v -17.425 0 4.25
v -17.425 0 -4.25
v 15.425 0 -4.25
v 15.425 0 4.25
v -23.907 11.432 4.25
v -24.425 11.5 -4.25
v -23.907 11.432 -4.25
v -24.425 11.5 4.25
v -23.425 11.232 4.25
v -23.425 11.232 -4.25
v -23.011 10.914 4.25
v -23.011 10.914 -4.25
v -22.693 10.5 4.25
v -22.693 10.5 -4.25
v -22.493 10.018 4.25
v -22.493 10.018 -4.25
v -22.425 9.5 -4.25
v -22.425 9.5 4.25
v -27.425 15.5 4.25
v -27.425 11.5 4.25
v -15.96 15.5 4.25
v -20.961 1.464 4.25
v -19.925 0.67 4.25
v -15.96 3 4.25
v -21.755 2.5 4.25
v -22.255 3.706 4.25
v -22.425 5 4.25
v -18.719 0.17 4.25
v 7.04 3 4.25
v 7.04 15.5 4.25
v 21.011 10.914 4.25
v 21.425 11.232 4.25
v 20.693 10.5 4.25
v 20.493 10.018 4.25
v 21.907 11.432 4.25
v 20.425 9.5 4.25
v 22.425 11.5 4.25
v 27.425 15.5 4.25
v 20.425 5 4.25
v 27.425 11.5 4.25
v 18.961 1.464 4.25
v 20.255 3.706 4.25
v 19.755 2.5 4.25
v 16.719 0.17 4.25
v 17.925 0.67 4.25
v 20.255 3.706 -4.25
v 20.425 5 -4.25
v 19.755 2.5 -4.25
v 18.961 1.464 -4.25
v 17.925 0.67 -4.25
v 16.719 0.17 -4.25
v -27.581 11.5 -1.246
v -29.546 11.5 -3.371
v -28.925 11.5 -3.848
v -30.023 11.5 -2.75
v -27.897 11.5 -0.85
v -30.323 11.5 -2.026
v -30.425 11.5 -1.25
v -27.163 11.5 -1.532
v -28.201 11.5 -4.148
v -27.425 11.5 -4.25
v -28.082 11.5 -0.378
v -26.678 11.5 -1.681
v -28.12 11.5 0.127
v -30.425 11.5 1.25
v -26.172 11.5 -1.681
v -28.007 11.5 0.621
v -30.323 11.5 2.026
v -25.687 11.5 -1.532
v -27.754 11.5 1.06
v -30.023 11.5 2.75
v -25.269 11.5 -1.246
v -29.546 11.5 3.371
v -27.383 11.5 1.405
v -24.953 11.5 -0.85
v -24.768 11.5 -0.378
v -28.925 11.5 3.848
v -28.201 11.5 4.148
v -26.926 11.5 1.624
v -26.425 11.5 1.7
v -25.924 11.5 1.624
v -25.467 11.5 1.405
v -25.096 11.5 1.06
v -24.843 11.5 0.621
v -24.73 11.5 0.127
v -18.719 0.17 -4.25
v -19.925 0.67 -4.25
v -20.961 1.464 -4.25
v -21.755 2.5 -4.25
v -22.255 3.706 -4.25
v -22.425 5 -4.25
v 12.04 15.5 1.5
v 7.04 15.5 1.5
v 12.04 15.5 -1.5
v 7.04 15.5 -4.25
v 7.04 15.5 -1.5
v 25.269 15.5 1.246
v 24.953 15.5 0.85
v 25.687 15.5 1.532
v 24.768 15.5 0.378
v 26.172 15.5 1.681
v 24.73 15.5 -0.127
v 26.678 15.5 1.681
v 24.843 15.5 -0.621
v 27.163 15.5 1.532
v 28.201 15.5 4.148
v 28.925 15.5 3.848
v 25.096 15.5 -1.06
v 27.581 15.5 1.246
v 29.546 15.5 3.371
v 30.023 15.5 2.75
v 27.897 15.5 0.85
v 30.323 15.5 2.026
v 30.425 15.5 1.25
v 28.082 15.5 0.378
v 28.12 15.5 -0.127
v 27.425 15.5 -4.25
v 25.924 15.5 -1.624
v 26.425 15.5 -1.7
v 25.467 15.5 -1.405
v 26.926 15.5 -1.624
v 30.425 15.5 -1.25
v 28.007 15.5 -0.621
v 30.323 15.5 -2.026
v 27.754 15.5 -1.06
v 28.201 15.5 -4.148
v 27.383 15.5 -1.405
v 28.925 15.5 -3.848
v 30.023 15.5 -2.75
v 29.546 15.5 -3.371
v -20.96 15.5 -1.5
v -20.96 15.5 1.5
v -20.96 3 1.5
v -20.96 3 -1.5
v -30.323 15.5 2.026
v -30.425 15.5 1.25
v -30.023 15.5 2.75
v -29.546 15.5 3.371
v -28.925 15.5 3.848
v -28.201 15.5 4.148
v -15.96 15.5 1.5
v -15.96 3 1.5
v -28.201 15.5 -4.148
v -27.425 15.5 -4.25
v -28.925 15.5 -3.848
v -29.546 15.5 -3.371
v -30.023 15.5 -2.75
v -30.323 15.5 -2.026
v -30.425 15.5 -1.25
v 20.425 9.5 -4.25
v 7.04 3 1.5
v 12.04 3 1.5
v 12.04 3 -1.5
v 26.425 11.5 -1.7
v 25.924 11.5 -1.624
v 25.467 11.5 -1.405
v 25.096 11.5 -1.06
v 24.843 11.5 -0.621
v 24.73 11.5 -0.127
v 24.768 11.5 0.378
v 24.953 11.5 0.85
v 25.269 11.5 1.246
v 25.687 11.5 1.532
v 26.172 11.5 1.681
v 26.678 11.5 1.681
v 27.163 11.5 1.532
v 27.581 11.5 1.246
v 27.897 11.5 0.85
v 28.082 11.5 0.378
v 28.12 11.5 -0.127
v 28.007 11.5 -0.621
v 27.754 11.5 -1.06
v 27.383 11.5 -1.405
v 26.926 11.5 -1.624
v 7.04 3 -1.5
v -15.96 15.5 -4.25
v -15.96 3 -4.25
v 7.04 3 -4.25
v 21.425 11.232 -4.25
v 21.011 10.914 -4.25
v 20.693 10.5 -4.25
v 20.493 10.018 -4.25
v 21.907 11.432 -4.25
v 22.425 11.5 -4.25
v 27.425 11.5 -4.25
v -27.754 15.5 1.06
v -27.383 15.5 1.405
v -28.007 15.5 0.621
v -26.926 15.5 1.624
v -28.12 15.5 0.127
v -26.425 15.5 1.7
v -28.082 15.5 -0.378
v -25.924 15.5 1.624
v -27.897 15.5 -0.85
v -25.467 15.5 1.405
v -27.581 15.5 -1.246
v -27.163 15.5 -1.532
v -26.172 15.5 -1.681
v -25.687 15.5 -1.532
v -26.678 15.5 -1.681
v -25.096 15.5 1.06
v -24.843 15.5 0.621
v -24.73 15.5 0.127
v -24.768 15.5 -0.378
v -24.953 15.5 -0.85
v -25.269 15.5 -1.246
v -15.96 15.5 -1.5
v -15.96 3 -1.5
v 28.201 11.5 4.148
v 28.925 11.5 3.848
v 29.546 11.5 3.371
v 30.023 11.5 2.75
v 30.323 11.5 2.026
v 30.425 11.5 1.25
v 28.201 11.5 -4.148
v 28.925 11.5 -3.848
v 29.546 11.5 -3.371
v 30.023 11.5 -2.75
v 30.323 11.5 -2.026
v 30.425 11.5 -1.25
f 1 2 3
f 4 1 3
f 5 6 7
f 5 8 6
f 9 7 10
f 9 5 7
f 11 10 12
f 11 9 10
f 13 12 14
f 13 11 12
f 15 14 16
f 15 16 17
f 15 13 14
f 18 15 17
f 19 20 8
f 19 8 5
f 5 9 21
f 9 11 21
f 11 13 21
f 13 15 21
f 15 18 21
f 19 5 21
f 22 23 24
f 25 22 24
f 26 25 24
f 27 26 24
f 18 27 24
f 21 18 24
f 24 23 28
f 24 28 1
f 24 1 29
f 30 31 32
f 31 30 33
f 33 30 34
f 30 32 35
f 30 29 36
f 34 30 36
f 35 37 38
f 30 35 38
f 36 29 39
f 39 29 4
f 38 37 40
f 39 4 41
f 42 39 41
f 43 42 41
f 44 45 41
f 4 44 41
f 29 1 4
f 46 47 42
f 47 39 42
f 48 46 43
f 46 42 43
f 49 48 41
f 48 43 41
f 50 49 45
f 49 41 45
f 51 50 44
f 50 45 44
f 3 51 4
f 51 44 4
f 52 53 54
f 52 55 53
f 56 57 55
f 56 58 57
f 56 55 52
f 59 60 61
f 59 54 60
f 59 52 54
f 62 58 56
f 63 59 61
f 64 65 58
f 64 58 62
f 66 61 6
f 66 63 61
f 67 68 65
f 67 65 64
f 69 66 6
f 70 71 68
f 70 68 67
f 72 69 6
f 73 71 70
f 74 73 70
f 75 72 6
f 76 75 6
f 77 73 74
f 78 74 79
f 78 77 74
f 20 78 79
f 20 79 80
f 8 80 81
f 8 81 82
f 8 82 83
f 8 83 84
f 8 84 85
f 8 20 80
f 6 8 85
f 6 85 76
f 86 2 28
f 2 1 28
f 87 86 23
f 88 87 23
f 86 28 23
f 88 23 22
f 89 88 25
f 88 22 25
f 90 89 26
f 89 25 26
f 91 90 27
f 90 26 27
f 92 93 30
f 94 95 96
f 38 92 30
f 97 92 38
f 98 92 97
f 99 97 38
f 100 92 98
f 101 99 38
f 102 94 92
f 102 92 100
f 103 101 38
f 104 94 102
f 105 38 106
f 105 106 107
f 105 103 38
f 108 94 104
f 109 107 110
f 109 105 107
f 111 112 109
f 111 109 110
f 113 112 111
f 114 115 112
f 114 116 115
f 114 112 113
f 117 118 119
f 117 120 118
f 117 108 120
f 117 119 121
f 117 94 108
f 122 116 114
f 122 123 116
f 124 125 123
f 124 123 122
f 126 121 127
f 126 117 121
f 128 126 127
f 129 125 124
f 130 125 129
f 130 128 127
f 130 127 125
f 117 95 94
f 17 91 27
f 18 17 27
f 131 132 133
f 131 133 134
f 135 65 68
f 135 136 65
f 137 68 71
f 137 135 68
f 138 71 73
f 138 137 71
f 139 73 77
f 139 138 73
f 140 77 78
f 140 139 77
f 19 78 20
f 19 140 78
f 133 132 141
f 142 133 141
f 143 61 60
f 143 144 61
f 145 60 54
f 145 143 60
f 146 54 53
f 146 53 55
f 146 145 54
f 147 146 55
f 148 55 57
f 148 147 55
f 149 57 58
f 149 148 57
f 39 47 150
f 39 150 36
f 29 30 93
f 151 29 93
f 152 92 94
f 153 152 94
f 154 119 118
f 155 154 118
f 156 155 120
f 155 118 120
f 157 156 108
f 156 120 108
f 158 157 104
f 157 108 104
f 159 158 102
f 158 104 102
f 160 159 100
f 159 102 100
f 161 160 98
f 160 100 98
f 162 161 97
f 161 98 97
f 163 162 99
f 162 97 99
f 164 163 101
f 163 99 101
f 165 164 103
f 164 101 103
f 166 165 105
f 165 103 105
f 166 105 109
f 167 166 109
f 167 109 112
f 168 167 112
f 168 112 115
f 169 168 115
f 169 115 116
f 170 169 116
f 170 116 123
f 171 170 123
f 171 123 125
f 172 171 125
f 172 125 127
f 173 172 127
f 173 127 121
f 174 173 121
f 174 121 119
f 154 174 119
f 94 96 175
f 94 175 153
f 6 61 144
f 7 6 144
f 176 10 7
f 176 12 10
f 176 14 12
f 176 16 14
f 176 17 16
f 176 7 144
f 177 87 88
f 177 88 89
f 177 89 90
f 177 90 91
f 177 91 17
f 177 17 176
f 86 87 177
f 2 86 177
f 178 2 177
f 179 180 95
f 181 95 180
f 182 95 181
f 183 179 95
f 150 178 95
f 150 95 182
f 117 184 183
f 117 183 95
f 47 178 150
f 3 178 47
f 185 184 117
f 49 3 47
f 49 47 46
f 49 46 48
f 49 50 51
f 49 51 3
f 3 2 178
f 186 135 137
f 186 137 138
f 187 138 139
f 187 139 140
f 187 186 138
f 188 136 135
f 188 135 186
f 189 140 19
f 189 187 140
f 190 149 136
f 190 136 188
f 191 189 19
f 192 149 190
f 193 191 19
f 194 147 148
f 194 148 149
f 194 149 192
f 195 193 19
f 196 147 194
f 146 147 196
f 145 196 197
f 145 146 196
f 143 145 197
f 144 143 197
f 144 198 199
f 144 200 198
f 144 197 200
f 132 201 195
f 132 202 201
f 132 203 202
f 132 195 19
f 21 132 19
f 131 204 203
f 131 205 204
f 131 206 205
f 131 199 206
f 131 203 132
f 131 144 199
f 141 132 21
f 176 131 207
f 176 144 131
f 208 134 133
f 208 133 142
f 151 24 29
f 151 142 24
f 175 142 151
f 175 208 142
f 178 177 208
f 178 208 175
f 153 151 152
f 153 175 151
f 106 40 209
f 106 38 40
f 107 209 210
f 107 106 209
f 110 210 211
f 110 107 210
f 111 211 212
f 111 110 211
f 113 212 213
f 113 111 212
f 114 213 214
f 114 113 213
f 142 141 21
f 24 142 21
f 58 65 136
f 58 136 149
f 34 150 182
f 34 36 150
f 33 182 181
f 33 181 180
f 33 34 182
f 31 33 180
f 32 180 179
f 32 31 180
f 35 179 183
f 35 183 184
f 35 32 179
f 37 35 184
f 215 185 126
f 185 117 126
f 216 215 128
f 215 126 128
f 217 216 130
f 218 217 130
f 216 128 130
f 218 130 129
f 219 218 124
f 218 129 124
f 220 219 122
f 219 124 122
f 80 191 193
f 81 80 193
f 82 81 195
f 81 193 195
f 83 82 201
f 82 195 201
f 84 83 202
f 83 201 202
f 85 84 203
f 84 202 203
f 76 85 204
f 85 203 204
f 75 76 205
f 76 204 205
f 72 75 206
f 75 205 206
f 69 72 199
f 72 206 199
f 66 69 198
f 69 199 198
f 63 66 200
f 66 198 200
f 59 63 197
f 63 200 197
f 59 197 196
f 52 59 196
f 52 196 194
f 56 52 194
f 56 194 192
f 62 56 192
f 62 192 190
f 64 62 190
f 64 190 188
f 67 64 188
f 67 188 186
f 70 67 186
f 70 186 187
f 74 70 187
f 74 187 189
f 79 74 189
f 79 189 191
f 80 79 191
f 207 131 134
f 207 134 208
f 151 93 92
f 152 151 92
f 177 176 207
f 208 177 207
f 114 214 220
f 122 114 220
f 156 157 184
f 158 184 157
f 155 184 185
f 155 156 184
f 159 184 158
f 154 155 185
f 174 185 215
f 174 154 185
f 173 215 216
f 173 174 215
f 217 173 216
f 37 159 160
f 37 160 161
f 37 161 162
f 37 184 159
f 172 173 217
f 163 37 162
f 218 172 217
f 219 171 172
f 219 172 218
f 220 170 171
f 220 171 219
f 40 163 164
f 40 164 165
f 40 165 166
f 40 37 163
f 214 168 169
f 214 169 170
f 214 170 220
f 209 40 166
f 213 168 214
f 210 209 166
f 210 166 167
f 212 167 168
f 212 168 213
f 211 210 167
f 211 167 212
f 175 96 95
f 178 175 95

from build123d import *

# Parameters (mm, degrees)
SKETCH1_W           = 60.85
SKETCH1_H           = 8.5
BOSS_EXTRUDE1_DEPTH = 15.5
SKETCH4_R           = 1.7
CUT_EXTRUDE3_DEPTH  = 35.409201168
SKETCH2_W           = 5
SKETCH2_H           = 3
CUT_EXTRUDE1_DEPTH  = 12.5
SKETCH3_W           = 8
SKETCH3_H           = 8.5
SKETCH3_W_2         = 10
CUT_EXTRUDE2_DEPTH  = 11.5
FILLET1_R           = 2
FILLET2_R           = 3
FILLET3_R           = 5


with BuildPart() as part:
    # Sketch1 → Boss-Extrude1 (new body)
    with BuildSketch(Plane(origin=(0, 0, 0), x_dir=(1, 0, 0), z_dir=(0, 1, 0))):
        Rectangle(SKETCH1_W, SKETCH1_H)
    extrude(amount=BOSS_EXTRUDE1_DEPTH)

    # Sketch4 → Cut-Extrude3 (cut, through all)
    with BuildSketch(Plane(origin=(0, 15.5, 0), x_dir=(1, 0, 0), z_dir=(0, 1, 0))):
        with Locations(Location((-26.425, 0, 0), (0, 0, 270))):
            Circle(SKETCH4_R)
        with Locations(Location((26.425, 0, 0), (0, 0, 90))):
            Circle(SKETCH4_R)
    extrude(amount=-CUT_EXTRUDE3_DEPTH, mode=Mode.SUBTRACT)

    # Sketch2 → Cut-Extrude1 (cut)
    with BuildSketch(Plane(origin=(0, 15.5, 0), x_dir=(1, 0, 0), z_dir=(0, 1, 0))):
        Polygon((-15.96, -1.5), (-15.96, -4.25), (7.04, -4.25), (7.04, -1.5), (7.04, 1.5), (7.04, 4.25), (-15.96, 4.25), (-15.96, 1.5), align=None)
        with Locations((-18.46, 0)):
            Rectangle(SKETCH2_W, SKETCH2_H)
        with Locations((9.54, 0)):
            Rectangle(SKETCH2_W, SKETCH2_H)
    extrude(amount=-CUT_EXTRUDE1_DEPTH, mode=Mode.SUBTRACT)

    # Sketch3 → Cut-Extrude2 (cut)
    with BuildSketch(Plane.XZ):
        with Locations((-26.425, 0)):
            Rectangle(SKETCH3_W, SKETCH3_H)
        with Locations((25.425, 0)):
            Rectangle(SKETCH3_W_2, SKETCH3_H)
    extrude(amount=-CUT_EXTRUDE2_DEPTH, mode=Mode.SUBTRACT)

    # Fillet1
    fillet1_edges = [part.edges().sort_by_distance(p)[0] for p in [
        (-22.425, 11.5, 0),
        (20.425, 11.5, 0),
    ]]
    fillet(fillet1_edges, radius=FILLET1_R)

    # Fillet2
    fillet2_edges = [part.edges().sort_by_distance(p)[0] for p in [
        (30.425, 13.5, 4.25),
        (-30.425, 13.5, 4.25),
        (-30.425, 13.5, -4.25),
        (30.425, 13.5, -4.25),
    ]]
    fillet(fillet2_edges, radius=FILLET2_R)

    # Fillet3
    fillet3_edges = [part.edges().sort_by_distance(p)[0] for p in [
        (-22.425, 0, 0),
        (20.425, 0, 0),
    ]]
    fillet(fillet3_edges, radius=FILLET3_R)


solid = part.part
